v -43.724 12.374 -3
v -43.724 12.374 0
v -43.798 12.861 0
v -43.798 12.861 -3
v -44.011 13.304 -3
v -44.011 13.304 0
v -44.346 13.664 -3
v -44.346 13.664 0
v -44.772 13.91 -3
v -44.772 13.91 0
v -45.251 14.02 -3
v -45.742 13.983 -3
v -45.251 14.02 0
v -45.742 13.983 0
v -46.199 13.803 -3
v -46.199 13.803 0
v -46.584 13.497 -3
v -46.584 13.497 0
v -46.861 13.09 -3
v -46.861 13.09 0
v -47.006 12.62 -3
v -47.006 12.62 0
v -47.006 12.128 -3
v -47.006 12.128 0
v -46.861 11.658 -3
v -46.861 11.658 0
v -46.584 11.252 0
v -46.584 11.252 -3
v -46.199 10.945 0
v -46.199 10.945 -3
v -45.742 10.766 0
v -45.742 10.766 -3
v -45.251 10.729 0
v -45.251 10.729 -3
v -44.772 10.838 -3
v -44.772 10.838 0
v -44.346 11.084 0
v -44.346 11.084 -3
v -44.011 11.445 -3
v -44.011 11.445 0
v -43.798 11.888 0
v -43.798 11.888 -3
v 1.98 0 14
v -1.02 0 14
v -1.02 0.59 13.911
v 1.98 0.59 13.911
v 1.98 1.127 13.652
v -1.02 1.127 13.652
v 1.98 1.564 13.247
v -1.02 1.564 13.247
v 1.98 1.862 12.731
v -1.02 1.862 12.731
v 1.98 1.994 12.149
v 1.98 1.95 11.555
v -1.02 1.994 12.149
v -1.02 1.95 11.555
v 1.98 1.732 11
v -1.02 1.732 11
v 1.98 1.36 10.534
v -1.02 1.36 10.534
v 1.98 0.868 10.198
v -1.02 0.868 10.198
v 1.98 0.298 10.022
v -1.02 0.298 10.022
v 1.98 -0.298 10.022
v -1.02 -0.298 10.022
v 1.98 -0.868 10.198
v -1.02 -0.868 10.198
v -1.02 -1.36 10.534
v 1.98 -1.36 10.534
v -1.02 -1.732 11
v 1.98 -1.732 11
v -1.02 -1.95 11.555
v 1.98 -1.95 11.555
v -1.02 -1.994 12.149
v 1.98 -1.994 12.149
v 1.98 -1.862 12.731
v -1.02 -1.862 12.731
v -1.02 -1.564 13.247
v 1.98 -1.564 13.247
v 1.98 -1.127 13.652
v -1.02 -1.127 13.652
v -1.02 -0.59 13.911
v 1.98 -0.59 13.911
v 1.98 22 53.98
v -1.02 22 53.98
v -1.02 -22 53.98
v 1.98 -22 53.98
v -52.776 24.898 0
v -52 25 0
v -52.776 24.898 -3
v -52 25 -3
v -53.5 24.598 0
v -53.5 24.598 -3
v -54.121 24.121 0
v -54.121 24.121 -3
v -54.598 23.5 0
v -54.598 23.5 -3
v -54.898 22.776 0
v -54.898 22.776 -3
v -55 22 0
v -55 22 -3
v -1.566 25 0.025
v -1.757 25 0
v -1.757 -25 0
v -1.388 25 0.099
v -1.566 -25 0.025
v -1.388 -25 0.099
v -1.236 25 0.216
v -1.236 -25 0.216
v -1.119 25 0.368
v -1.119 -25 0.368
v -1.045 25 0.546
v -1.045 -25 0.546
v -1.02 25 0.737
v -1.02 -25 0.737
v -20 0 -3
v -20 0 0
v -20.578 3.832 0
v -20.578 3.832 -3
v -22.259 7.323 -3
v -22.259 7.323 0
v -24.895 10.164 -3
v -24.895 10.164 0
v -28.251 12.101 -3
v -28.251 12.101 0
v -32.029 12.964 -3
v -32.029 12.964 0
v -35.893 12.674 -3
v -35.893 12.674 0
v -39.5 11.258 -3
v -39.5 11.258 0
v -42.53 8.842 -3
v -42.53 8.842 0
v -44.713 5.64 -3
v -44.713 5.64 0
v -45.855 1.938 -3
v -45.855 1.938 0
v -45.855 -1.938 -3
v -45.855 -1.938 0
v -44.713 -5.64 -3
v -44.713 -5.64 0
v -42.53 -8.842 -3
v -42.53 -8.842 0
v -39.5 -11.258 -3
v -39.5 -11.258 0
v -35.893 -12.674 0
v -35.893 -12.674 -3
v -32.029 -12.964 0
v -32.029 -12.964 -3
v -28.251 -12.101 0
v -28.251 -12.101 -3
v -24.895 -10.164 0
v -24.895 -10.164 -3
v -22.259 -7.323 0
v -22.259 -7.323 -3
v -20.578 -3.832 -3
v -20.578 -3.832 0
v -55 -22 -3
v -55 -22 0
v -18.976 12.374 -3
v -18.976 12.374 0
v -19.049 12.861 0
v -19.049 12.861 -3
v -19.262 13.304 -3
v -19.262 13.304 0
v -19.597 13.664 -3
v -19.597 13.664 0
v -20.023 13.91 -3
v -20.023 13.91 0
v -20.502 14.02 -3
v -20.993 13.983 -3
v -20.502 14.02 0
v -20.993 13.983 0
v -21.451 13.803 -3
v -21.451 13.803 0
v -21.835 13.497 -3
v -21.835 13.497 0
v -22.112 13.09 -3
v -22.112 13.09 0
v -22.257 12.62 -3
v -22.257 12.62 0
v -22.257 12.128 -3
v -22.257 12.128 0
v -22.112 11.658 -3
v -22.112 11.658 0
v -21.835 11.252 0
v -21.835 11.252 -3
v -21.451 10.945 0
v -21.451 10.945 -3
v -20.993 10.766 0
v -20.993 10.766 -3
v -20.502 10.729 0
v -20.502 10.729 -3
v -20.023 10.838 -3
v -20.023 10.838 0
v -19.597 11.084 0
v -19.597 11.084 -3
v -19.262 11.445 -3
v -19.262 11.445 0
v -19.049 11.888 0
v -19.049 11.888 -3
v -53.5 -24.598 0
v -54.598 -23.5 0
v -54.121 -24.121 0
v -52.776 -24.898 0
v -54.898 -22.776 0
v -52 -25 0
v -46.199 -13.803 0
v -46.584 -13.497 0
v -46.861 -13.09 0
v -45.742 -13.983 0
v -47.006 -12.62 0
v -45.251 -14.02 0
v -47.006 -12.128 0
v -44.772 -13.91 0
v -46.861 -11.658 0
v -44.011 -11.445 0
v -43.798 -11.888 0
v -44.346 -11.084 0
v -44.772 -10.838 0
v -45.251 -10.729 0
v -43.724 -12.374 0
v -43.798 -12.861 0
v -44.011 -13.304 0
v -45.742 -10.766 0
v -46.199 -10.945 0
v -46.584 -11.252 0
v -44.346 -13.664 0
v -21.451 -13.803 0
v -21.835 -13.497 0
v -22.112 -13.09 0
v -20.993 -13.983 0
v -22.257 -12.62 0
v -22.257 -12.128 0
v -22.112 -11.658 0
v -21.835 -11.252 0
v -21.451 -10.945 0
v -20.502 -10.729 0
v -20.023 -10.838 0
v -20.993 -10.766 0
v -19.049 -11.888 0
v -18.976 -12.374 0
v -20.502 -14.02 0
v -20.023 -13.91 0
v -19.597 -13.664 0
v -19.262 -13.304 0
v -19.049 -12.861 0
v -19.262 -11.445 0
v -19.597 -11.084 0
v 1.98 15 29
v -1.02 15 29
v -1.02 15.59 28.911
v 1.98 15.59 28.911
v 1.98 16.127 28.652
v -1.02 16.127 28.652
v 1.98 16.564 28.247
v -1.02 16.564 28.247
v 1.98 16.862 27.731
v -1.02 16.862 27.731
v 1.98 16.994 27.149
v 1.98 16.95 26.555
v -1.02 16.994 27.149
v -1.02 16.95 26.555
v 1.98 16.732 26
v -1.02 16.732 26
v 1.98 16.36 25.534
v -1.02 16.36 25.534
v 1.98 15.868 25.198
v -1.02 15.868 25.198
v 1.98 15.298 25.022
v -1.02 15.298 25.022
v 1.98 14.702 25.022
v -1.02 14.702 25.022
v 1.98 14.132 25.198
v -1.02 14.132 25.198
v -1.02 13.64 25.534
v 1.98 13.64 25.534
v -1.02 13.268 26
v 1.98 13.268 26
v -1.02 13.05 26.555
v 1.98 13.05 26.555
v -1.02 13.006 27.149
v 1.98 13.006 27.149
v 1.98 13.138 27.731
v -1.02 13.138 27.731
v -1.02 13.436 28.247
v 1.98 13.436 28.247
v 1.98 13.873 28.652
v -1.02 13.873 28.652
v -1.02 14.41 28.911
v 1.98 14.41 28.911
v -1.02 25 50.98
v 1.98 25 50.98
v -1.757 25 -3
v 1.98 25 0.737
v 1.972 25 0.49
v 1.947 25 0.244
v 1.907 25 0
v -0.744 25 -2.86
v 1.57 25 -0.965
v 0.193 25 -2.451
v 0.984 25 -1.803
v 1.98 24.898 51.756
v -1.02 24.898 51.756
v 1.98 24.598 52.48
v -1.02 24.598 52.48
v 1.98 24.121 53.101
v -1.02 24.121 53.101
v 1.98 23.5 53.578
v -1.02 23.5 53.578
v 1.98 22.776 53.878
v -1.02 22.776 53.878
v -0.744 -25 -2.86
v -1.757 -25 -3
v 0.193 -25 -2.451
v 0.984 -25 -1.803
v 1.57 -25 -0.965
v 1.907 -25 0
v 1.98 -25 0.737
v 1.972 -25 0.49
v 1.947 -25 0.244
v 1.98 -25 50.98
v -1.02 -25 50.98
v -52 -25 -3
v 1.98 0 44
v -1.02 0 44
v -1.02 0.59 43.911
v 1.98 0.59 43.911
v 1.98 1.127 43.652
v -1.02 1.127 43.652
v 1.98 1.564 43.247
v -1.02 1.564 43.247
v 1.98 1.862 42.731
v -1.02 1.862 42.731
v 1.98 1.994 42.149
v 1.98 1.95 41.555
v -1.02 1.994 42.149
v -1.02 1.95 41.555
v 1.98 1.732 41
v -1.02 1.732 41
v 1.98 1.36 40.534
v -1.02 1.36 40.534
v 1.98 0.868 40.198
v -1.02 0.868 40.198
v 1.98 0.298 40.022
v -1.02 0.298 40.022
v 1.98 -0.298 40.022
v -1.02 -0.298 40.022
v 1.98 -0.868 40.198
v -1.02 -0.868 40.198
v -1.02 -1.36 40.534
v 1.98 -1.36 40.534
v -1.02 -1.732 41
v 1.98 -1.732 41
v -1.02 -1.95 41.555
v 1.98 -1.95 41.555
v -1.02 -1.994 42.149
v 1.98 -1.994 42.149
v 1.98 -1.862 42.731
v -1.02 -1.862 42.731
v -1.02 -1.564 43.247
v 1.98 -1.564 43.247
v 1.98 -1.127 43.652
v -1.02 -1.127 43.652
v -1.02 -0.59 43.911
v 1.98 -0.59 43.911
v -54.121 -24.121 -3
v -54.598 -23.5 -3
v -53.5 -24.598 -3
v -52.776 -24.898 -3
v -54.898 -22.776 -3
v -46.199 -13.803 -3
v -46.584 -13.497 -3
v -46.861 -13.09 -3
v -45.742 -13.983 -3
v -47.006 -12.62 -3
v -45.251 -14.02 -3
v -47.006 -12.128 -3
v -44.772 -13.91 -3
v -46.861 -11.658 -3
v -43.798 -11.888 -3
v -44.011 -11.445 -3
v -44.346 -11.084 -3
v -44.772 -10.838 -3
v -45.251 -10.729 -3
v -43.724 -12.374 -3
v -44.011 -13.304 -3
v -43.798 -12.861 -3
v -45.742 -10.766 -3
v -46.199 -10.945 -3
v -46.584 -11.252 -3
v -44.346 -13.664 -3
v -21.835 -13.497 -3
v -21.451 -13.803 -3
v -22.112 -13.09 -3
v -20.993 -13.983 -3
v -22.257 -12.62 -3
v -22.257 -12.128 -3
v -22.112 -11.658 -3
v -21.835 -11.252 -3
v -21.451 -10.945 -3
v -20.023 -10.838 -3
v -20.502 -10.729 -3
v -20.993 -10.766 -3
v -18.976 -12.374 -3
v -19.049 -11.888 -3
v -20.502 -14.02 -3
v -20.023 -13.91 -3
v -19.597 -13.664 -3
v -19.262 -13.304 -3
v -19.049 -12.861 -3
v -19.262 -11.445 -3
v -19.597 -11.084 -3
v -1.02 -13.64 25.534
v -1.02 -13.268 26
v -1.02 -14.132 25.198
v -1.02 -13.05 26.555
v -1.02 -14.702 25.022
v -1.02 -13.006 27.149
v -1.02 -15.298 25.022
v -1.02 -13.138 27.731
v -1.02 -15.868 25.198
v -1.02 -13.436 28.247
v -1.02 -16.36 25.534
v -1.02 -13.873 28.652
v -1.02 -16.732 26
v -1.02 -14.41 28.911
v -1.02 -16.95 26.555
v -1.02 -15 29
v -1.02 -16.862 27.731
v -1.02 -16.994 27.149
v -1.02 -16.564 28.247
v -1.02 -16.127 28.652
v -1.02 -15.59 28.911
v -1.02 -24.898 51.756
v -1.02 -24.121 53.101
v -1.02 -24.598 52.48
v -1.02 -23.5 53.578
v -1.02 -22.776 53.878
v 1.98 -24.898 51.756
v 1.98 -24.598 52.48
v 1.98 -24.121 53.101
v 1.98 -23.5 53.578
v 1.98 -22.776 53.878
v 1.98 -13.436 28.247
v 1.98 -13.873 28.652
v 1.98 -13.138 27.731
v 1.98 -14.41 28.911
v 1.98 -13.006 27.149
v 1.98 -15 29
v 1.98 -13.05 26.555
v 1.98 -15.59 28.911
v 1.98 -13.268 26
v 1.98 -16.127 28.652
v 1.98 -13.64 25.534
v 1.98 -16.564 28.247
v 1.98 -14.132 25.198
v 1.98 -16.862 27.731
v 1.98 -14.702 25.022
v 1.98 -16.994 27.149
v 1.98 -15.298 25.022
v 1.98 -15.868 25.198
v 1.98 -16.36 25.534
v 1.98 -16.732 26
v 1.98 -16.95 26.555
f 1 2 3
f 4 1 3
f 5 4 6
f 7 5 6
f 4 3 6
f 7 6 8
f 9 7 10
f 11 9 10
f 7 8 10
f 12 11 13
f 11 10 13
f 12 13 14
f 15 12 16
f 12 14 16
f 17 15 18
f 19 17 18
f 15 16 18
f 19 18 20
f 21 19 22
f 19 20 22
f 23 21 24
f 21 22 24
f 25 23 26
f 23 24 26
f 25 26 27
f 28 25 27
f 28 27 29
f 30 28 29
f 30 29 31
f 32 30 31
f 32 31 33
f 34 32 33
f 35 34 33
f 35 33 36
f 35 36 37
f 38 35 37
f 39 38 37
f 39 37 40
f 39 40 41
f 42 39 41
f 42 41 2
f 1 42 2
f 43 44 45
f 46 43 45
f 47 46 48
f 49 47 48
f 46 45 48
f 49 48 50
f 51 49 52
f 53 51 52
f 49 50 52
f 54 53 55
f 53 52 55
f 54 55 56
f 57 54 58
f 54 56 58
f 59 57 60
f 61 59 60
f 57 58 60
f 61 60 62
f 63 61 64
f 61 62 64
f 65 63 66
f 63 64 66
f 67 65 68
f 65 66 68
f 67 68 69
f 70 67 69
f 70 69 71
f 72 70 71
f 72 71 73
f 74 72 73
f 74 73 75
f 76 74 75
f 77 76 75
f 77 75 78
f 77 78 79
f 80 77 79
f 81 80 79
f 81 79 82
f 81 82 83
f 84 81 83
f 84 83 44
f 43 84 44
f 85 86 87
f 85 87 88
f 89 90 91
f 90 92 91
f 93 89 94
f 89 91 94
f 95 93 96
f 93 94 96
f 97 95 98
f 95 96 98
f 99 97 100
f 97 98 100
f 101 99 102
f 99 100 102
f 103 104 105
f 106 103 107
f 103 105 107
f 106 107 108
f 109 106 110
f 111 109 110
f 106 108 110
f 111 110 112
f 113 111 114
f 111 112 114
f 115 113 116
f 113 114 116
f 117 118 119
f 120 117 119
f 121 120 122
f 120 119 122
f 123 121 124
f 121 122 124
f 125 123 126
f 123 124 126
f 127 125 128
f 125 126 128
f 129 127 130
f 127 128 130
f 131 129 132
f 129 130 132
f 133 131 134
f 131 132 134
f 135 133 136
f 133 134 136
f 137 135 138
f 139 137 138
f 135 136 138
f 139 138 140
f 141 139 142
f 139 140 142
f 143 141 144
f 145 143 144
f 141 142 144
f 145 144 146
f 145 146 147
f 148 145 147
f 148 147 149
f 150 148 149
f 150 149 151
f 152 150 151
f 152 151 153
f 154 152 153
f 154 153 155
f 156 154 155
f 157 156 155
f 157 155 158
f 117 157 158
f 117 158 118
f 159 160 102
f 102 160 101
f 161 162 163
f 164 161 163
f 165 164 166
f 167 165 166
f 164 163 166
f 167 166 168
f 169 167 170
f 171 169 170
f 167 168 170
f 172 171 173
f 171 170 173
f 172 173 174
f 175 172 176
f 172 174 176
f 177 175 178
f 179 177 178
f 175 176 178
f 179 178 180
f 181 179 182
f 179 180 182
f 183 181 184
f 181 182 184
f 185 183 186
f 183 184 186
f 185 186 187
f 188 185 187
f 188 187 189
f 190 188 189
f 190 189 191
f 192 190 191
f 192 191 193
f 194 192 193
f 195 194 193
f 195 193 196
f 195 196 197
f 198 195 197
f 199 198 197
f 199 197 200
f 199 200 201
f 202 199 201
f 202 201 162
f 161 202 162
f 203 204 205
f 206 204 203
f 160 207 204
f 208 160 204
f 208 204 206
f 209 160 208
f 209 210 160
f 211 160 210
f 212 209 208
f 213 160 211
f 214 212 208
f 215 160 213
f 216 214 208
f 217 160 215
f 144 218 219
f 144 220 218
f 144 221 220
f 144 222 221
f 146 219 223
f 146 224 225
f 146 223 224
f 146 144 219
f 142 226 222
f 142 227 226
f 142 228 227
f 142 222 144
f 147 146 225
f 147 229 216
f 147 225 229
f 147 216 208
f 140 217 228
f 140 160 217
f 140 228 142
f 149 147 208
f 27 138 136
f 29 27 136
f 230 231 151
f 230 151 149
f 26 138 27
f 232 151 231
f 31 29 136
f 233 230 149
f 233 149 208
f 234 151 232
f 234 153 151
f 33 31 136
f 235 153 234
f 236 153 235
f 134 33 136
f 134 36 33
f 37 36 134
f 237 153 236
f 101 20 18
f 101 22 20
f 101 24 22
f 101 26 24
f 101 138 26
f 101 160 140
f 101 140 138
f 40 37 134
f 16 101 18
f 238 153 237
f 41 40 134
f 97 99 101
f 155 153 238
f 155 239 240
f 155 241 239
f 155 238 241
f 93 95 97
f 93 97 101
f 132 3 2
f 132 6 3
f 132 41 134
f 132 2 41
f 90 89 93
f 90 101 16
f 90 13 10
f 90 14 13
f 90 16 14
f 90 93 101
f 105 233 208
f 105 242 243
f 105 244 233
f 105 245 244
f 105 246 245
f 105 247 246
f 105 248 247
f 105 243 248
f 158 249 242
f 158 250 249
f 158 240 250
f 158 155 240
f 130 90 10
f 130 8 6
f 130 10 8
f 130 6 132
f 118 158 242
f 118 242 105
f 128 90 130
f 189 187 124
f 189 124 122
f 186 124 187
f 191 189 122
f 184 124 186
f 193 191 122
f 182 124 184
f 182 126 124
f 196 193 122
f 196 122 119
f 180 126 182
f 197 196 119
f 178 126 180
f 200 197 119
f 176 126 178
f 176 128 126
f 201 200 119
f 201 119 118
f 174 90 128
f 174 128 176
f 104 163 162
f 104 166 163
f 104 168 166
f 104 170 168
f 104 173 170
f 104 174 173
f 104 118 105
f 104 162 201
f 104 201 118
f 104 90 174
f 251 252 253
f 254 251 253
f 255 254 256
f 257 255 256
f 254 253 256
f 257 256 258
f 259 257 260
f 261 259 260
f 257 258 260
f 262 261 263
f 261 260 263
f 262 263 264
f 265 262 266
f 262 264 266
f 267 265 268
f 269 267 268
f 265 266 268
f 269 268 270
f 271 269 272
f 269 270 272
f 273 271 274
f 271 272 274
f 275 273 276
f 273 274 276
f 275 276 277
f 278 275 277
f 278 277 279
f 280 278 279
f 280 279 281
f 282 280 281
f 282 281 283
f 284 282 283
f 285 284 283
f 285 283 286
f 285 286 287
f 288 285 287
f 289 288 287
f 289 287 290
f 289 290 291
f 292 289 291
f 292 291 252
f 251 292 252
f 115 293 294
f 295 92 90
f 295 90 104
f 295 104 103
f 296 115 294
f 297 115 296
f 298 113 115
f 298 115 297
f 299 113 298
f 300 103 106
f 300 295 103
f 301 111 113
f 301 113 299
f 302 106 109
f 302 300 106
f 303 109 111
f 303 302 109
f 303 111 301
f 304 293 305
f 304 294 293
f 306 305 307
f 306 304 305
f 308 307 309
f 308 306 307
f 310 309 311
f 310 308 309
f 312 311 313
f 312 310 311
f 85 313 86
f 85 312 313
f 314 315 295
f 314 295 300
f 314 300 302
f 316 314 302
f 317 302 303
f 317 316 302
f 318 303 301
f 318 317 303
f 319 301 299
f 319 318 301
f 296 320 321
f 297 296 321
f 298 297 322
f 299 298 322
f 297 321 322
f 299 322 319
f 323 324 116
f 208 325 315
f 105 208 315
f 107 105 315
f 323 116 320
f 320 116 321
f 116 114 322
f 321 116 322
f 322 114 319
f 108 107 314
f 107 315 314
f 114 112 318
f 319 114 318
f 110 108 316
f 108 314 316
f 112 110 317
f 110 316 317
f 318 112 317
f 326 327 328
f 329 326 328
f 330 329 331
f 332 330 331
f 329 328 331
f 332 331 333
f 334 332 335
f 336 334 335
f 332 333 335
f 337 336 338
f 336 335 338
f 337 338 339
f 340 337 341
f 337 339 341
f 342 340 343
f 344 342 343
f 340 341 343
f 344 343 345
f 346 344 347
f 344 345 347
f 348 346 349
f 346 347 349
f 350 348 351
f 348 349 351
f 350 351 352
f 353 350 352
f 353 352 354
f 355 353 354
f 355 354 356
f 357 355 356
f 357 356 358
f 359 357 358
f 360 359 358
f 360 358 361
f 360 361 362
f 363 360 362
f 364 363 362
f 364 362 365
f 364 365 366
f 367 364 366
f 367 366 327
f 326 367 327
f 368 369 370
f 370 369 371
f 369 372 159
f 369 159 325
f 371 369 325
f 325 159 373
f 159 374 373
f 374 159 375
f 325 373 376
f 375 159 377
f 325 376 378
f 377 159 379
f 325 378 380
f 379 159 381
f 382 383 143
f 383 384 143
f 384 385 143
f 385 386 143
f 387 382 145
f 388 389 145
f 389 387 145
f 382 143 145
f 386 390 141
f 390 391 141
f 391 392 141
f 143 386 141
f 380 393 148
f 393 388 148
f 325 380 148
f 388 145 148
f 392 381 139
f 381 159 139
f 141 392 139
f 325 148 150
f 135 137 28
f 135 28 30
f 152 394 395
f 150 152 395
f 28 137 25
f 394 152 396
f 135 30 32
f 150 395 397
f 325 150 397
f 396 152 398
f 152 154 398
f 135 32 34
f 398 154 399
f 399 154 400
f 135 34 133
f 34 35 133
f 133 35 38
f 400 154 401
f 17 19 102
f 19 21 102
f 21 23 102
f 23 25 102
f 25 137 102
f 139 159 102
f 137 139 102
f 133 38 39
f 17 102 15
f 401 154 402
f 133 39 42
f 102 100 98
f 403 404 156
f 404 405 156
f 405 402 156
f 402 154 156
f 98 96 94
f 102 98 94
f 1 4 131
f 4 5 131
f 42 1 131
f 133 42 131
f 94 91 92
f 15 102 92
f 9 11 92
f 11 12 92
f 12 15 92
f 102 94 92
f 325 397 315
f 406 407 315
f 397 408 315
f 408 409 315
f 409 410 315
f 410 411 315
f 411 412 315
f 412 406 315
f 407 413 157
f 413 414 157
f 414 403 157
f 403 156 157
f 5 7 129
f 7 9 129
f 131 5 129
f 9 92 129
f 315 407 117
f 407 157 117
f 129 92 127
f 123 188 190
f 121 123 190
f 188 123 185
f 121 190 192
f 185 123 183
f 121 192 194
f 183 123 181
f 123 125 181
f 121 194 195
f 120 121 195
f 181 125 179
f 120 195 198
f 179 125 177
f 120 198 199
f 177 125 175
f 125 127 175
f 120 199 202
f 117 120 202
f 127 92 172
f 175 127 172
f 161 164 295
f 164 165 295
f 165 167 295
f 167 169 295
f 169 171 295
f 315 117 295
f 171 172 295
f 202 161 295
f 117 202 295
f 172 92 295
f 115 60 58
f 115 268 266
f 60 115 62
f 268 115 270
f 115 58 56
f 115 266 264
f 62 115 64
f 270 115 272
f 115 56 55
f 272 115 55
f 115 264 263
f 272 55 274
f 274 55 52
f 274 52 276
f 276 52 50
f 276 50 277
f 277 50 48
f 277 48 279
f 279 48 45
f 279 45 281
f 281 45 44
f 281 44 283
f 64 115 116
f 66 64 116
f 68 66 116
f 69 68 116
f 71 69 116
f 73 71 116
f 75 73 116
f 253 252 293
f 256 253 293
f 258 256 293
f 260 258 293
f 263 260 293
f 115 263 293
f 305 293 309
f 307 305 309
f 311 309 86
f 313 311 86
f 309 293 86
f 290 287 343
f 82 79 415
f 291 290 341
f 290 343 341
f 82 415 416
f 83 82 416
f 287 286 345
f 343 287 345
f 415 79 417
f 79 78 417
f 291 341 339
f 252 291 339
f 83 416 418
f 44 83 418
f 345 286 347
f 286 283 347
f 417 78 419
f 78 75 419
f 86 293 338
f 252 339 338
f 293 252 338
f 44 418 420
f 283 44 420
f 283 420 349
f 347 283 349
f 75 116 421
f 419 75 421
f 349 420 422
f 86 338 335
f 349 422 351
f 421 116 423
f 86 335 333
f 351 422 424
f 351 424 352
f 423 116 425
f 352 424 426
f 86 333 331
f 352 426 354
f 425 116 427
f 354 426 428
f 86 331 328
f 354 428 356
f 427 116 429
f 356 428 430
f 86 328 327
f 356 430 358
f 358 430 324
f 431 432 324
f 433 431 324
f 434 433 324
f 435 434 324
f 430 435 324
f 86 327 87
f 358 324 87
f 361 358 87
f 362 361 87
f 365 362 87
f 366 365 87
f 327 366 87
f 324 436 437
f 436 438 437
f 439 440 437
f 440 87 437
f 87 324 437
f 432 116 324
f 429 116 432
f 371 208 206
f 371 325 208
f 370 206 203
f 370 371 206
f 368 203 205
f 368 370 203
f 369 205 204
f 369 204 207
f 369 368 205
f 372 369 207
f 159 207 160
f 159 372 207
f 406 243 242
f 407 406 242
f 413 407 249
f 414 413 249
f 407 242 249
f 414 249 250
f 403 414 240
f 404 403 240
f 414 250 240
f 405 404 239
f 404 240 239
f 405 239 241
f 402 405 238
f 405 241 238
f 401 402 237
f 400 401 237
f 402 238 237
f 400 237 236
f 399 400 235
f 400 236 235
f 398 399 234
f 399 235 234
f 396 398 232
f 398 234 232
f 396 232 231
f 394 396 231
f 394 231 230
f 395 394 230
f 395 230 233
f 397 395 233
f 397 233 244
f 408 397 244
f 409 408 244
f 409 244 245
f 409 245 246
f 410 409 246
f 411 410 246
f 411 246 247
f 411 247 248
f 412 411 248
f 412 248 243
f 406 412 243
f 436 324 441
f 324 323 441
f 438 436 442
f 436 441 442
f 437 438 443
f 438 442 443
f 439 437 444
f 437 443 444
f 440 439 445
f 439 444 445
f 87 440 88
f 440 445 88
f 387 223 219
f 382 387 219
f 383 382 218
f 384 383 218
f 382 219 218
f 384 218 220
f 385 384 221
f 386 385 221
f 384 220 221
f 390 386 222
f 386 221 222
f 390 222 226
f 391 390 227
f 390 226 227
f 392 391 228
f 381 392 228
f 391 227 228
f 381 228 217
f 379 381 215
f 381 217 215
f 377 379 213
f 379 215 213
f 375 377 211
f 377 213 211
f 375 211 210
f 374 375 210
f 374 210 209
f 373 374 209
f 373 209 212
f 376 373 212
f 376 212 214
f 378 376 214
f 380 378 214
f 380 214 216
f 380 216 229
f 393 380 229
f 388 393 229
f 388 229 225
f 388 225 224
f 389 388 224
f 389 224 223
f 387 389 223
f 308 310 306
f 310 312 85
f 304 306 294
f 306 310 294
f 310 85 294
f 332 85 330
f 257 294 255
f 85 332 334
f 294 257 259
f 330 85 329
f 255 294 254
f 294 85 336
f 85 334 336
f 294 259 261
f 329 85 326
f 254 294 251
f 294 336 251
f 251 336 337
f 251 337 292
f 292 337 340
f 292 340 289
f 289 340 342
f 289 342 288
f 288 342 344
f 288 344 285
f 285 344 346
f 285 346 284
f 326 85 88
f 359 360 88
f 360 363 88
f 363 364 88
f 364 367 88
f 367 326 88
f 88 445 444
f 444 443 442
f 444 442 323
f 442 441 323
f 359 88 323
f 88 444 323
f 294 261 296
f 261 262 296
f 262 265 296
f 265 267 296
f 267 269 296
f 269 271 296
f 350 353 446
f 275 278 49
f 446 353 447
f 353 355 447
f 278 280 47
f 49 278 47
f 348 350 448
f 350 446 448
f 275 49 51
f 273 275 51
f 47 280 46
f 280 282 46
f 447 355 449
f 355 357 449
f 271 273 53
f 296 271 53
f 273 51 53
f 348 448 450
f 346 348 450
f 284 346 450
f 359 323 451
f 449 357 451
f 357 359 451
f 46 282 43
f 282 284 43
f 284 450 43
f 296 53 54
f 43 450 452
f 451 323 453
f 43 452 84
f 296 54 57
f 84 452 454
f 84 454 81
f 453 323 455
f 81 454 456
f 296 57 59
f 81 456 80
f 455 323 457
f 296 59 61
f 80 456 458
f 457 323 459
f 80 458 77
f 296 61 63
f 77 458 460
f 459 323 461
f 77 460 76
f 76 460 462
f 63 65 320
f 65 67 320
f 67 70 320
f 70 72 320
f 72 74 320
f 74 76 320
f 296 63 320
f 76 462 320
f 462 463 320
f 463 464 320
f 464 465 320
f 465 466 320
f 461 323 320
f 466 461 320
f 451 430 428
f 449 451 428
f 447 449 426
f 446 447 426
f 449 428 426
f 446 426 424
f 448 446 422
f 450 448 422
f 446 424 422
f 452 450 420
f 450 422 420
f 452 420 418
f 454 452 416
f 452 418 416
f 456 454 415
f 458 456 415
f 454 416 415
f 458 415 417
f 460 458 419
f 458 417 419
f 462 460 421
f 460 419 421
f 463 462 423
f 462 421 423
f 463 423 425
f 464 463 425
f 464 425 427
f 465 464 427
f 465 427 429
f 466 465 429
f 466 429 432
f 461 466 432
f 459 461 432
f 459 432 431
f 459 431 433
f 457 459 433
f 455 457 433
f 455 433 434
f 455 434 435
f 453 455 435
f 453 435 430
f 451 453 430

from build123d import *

# Parameters (mm, degrees)
SKETCH_2_W             = 110
SKETCH_2_H             = 50
SM_BASE_FLANGE_1_DEPTH = 3
OTHER_START            = -25
OTHER_1_DEPTH          = 50
OTHER_1_2_DEPTH        = 50
SKETCH_8_R             = 2
CUT_EXTRUDE_1_DEPTH    = 10
FILLET_1_R             = 3
SKETCH_9_R             = 13
CUT_EXTRUDE_2_DEPTH    = 10
SKETCH_10_R            = 1.65
CUT_EXTRUDE_3_DEPTH    = 82.01751709


# Read off the part's stored shape, not the designer's step: 绘制的折弯1
# Sheet-metal steps are written as plain solids
with BuildPart() as part:
    # Sketch 2 → 基体-法兰1 (new body)
    with BuildSketch(Plane.XY):
        Rectangle(SKETCH_2_W, SKETCH_2_H)
    extrude(amount=-SM_BASE_FLANGE_1_DEPTH)

    # Other 1 outline → Other 1 (cut)
    with BuildSketch(Plane(origin=(0, 0, 0), x_dir=(1, 0, 0), z_dir=(0, 1, 0)).offset(OTHER_START)):
        with BuildLine():
            ThreePointArc((-1.756621532, 3), (0.610845469, 2.154295979), (1.906655689, 0))
            Line((1.906655689, 0), (55, 0))
            Line((55, 0), (55, 3))
            Line((55, 3), (-1.756621532, 3))
        make_face()
    extrude(amount=OTHER_1_DEPTH, mode=Mode.SUBTRACT)

    # Other 1 2 outline → Other 1 2 (add)
    with BuildSketch(Plane(origin=(0, 0, 0), x_dir=(1, 0, 0), z_dir=(0, 1, 0)).offset(OTHER_START)):
        with BuildLine():
            Line((-1.020021532, -0.7366), (-1.020021532, -53.979978468))
            Line((-1.020021532, -53.979978468), (1.979978468, -53.979978468))
            Line((1.979978468, -53.979978468), (1.979978468, -0.7366))
            ThreePointArc((1.979978468, -0.7366), (1.961602589, -0.36647982), (1.906655689, 0))
            Line((1.906655689, 0), (-1.756621532, 0))
            ThreePointArc((-1.756621532, 0), (-1.235766677, -0.215745145), (-1.020021532, -0.7366))
        make_face()
    extrude(amount=OTHER_1_2_DEPTH)

    # 草图8 → 切除-拉伸1 (cut)
    with BuildSketch(Plane.ZY.offset(1.020021532)):
        with Locations((12, 0)):
            Circle(SKETCH_8_R)
        with Locations((42, 0)):
            Circle(SKETCH_8_R)
        with Locations((27, 15)):
            Circle(SKETCH_8_R)
        with Locations((27, -15)):
            Circle(SKETCH_8_R)
    extrude(amount=-CUT_EXTRUDE_1_DEPTH, mode=Mode.SUBTRACT)

    # 圆角1
    fillet_1_edges = [part.edges().sort_by_distance(p)[0] for p in [
        (-55, -25, -1.5),
        (-55, 25, -1.5),
        (0.479978468, -25, 53.979978468),
        (0.479978468, 25, 53.979978468),
    ]]
    fillet(fillet_1_edges, radius=FILLET_1_R)

    # 草图9 → 切除-拉伸2 (cut)
    with BuildSketch(Plane.XY):
        with Locations((-33, 0)):
            Circle(SKETCH_9_R)
    extrude(amount=-CUT_EXTRUDE_2_DEPTH, mode=Mode.SUBTRACT)

    # 草图10 → 切除-拉伸3 (cut, through all)
    with BuildSketch(Plane.XY):
        with Locations((-20.625631329, 12.374368671)):
            Circle(SKETCH_10_R)
        with Locations((-20.625631329, -12.374368671)):
            Circle(SKETCH_10_R)
        with Locations((-45.374368671, -12.374368671)):
            Circle(SKETCH_10_R)
        with Locations((-45.374368671, 12.374368671)):
            Circle(SKETCH_10_R)
    extrude(amount=-CUT_EXTRUDE_3_DEPTH, mode=Mode.SUBTRACT)


solid = part.part
